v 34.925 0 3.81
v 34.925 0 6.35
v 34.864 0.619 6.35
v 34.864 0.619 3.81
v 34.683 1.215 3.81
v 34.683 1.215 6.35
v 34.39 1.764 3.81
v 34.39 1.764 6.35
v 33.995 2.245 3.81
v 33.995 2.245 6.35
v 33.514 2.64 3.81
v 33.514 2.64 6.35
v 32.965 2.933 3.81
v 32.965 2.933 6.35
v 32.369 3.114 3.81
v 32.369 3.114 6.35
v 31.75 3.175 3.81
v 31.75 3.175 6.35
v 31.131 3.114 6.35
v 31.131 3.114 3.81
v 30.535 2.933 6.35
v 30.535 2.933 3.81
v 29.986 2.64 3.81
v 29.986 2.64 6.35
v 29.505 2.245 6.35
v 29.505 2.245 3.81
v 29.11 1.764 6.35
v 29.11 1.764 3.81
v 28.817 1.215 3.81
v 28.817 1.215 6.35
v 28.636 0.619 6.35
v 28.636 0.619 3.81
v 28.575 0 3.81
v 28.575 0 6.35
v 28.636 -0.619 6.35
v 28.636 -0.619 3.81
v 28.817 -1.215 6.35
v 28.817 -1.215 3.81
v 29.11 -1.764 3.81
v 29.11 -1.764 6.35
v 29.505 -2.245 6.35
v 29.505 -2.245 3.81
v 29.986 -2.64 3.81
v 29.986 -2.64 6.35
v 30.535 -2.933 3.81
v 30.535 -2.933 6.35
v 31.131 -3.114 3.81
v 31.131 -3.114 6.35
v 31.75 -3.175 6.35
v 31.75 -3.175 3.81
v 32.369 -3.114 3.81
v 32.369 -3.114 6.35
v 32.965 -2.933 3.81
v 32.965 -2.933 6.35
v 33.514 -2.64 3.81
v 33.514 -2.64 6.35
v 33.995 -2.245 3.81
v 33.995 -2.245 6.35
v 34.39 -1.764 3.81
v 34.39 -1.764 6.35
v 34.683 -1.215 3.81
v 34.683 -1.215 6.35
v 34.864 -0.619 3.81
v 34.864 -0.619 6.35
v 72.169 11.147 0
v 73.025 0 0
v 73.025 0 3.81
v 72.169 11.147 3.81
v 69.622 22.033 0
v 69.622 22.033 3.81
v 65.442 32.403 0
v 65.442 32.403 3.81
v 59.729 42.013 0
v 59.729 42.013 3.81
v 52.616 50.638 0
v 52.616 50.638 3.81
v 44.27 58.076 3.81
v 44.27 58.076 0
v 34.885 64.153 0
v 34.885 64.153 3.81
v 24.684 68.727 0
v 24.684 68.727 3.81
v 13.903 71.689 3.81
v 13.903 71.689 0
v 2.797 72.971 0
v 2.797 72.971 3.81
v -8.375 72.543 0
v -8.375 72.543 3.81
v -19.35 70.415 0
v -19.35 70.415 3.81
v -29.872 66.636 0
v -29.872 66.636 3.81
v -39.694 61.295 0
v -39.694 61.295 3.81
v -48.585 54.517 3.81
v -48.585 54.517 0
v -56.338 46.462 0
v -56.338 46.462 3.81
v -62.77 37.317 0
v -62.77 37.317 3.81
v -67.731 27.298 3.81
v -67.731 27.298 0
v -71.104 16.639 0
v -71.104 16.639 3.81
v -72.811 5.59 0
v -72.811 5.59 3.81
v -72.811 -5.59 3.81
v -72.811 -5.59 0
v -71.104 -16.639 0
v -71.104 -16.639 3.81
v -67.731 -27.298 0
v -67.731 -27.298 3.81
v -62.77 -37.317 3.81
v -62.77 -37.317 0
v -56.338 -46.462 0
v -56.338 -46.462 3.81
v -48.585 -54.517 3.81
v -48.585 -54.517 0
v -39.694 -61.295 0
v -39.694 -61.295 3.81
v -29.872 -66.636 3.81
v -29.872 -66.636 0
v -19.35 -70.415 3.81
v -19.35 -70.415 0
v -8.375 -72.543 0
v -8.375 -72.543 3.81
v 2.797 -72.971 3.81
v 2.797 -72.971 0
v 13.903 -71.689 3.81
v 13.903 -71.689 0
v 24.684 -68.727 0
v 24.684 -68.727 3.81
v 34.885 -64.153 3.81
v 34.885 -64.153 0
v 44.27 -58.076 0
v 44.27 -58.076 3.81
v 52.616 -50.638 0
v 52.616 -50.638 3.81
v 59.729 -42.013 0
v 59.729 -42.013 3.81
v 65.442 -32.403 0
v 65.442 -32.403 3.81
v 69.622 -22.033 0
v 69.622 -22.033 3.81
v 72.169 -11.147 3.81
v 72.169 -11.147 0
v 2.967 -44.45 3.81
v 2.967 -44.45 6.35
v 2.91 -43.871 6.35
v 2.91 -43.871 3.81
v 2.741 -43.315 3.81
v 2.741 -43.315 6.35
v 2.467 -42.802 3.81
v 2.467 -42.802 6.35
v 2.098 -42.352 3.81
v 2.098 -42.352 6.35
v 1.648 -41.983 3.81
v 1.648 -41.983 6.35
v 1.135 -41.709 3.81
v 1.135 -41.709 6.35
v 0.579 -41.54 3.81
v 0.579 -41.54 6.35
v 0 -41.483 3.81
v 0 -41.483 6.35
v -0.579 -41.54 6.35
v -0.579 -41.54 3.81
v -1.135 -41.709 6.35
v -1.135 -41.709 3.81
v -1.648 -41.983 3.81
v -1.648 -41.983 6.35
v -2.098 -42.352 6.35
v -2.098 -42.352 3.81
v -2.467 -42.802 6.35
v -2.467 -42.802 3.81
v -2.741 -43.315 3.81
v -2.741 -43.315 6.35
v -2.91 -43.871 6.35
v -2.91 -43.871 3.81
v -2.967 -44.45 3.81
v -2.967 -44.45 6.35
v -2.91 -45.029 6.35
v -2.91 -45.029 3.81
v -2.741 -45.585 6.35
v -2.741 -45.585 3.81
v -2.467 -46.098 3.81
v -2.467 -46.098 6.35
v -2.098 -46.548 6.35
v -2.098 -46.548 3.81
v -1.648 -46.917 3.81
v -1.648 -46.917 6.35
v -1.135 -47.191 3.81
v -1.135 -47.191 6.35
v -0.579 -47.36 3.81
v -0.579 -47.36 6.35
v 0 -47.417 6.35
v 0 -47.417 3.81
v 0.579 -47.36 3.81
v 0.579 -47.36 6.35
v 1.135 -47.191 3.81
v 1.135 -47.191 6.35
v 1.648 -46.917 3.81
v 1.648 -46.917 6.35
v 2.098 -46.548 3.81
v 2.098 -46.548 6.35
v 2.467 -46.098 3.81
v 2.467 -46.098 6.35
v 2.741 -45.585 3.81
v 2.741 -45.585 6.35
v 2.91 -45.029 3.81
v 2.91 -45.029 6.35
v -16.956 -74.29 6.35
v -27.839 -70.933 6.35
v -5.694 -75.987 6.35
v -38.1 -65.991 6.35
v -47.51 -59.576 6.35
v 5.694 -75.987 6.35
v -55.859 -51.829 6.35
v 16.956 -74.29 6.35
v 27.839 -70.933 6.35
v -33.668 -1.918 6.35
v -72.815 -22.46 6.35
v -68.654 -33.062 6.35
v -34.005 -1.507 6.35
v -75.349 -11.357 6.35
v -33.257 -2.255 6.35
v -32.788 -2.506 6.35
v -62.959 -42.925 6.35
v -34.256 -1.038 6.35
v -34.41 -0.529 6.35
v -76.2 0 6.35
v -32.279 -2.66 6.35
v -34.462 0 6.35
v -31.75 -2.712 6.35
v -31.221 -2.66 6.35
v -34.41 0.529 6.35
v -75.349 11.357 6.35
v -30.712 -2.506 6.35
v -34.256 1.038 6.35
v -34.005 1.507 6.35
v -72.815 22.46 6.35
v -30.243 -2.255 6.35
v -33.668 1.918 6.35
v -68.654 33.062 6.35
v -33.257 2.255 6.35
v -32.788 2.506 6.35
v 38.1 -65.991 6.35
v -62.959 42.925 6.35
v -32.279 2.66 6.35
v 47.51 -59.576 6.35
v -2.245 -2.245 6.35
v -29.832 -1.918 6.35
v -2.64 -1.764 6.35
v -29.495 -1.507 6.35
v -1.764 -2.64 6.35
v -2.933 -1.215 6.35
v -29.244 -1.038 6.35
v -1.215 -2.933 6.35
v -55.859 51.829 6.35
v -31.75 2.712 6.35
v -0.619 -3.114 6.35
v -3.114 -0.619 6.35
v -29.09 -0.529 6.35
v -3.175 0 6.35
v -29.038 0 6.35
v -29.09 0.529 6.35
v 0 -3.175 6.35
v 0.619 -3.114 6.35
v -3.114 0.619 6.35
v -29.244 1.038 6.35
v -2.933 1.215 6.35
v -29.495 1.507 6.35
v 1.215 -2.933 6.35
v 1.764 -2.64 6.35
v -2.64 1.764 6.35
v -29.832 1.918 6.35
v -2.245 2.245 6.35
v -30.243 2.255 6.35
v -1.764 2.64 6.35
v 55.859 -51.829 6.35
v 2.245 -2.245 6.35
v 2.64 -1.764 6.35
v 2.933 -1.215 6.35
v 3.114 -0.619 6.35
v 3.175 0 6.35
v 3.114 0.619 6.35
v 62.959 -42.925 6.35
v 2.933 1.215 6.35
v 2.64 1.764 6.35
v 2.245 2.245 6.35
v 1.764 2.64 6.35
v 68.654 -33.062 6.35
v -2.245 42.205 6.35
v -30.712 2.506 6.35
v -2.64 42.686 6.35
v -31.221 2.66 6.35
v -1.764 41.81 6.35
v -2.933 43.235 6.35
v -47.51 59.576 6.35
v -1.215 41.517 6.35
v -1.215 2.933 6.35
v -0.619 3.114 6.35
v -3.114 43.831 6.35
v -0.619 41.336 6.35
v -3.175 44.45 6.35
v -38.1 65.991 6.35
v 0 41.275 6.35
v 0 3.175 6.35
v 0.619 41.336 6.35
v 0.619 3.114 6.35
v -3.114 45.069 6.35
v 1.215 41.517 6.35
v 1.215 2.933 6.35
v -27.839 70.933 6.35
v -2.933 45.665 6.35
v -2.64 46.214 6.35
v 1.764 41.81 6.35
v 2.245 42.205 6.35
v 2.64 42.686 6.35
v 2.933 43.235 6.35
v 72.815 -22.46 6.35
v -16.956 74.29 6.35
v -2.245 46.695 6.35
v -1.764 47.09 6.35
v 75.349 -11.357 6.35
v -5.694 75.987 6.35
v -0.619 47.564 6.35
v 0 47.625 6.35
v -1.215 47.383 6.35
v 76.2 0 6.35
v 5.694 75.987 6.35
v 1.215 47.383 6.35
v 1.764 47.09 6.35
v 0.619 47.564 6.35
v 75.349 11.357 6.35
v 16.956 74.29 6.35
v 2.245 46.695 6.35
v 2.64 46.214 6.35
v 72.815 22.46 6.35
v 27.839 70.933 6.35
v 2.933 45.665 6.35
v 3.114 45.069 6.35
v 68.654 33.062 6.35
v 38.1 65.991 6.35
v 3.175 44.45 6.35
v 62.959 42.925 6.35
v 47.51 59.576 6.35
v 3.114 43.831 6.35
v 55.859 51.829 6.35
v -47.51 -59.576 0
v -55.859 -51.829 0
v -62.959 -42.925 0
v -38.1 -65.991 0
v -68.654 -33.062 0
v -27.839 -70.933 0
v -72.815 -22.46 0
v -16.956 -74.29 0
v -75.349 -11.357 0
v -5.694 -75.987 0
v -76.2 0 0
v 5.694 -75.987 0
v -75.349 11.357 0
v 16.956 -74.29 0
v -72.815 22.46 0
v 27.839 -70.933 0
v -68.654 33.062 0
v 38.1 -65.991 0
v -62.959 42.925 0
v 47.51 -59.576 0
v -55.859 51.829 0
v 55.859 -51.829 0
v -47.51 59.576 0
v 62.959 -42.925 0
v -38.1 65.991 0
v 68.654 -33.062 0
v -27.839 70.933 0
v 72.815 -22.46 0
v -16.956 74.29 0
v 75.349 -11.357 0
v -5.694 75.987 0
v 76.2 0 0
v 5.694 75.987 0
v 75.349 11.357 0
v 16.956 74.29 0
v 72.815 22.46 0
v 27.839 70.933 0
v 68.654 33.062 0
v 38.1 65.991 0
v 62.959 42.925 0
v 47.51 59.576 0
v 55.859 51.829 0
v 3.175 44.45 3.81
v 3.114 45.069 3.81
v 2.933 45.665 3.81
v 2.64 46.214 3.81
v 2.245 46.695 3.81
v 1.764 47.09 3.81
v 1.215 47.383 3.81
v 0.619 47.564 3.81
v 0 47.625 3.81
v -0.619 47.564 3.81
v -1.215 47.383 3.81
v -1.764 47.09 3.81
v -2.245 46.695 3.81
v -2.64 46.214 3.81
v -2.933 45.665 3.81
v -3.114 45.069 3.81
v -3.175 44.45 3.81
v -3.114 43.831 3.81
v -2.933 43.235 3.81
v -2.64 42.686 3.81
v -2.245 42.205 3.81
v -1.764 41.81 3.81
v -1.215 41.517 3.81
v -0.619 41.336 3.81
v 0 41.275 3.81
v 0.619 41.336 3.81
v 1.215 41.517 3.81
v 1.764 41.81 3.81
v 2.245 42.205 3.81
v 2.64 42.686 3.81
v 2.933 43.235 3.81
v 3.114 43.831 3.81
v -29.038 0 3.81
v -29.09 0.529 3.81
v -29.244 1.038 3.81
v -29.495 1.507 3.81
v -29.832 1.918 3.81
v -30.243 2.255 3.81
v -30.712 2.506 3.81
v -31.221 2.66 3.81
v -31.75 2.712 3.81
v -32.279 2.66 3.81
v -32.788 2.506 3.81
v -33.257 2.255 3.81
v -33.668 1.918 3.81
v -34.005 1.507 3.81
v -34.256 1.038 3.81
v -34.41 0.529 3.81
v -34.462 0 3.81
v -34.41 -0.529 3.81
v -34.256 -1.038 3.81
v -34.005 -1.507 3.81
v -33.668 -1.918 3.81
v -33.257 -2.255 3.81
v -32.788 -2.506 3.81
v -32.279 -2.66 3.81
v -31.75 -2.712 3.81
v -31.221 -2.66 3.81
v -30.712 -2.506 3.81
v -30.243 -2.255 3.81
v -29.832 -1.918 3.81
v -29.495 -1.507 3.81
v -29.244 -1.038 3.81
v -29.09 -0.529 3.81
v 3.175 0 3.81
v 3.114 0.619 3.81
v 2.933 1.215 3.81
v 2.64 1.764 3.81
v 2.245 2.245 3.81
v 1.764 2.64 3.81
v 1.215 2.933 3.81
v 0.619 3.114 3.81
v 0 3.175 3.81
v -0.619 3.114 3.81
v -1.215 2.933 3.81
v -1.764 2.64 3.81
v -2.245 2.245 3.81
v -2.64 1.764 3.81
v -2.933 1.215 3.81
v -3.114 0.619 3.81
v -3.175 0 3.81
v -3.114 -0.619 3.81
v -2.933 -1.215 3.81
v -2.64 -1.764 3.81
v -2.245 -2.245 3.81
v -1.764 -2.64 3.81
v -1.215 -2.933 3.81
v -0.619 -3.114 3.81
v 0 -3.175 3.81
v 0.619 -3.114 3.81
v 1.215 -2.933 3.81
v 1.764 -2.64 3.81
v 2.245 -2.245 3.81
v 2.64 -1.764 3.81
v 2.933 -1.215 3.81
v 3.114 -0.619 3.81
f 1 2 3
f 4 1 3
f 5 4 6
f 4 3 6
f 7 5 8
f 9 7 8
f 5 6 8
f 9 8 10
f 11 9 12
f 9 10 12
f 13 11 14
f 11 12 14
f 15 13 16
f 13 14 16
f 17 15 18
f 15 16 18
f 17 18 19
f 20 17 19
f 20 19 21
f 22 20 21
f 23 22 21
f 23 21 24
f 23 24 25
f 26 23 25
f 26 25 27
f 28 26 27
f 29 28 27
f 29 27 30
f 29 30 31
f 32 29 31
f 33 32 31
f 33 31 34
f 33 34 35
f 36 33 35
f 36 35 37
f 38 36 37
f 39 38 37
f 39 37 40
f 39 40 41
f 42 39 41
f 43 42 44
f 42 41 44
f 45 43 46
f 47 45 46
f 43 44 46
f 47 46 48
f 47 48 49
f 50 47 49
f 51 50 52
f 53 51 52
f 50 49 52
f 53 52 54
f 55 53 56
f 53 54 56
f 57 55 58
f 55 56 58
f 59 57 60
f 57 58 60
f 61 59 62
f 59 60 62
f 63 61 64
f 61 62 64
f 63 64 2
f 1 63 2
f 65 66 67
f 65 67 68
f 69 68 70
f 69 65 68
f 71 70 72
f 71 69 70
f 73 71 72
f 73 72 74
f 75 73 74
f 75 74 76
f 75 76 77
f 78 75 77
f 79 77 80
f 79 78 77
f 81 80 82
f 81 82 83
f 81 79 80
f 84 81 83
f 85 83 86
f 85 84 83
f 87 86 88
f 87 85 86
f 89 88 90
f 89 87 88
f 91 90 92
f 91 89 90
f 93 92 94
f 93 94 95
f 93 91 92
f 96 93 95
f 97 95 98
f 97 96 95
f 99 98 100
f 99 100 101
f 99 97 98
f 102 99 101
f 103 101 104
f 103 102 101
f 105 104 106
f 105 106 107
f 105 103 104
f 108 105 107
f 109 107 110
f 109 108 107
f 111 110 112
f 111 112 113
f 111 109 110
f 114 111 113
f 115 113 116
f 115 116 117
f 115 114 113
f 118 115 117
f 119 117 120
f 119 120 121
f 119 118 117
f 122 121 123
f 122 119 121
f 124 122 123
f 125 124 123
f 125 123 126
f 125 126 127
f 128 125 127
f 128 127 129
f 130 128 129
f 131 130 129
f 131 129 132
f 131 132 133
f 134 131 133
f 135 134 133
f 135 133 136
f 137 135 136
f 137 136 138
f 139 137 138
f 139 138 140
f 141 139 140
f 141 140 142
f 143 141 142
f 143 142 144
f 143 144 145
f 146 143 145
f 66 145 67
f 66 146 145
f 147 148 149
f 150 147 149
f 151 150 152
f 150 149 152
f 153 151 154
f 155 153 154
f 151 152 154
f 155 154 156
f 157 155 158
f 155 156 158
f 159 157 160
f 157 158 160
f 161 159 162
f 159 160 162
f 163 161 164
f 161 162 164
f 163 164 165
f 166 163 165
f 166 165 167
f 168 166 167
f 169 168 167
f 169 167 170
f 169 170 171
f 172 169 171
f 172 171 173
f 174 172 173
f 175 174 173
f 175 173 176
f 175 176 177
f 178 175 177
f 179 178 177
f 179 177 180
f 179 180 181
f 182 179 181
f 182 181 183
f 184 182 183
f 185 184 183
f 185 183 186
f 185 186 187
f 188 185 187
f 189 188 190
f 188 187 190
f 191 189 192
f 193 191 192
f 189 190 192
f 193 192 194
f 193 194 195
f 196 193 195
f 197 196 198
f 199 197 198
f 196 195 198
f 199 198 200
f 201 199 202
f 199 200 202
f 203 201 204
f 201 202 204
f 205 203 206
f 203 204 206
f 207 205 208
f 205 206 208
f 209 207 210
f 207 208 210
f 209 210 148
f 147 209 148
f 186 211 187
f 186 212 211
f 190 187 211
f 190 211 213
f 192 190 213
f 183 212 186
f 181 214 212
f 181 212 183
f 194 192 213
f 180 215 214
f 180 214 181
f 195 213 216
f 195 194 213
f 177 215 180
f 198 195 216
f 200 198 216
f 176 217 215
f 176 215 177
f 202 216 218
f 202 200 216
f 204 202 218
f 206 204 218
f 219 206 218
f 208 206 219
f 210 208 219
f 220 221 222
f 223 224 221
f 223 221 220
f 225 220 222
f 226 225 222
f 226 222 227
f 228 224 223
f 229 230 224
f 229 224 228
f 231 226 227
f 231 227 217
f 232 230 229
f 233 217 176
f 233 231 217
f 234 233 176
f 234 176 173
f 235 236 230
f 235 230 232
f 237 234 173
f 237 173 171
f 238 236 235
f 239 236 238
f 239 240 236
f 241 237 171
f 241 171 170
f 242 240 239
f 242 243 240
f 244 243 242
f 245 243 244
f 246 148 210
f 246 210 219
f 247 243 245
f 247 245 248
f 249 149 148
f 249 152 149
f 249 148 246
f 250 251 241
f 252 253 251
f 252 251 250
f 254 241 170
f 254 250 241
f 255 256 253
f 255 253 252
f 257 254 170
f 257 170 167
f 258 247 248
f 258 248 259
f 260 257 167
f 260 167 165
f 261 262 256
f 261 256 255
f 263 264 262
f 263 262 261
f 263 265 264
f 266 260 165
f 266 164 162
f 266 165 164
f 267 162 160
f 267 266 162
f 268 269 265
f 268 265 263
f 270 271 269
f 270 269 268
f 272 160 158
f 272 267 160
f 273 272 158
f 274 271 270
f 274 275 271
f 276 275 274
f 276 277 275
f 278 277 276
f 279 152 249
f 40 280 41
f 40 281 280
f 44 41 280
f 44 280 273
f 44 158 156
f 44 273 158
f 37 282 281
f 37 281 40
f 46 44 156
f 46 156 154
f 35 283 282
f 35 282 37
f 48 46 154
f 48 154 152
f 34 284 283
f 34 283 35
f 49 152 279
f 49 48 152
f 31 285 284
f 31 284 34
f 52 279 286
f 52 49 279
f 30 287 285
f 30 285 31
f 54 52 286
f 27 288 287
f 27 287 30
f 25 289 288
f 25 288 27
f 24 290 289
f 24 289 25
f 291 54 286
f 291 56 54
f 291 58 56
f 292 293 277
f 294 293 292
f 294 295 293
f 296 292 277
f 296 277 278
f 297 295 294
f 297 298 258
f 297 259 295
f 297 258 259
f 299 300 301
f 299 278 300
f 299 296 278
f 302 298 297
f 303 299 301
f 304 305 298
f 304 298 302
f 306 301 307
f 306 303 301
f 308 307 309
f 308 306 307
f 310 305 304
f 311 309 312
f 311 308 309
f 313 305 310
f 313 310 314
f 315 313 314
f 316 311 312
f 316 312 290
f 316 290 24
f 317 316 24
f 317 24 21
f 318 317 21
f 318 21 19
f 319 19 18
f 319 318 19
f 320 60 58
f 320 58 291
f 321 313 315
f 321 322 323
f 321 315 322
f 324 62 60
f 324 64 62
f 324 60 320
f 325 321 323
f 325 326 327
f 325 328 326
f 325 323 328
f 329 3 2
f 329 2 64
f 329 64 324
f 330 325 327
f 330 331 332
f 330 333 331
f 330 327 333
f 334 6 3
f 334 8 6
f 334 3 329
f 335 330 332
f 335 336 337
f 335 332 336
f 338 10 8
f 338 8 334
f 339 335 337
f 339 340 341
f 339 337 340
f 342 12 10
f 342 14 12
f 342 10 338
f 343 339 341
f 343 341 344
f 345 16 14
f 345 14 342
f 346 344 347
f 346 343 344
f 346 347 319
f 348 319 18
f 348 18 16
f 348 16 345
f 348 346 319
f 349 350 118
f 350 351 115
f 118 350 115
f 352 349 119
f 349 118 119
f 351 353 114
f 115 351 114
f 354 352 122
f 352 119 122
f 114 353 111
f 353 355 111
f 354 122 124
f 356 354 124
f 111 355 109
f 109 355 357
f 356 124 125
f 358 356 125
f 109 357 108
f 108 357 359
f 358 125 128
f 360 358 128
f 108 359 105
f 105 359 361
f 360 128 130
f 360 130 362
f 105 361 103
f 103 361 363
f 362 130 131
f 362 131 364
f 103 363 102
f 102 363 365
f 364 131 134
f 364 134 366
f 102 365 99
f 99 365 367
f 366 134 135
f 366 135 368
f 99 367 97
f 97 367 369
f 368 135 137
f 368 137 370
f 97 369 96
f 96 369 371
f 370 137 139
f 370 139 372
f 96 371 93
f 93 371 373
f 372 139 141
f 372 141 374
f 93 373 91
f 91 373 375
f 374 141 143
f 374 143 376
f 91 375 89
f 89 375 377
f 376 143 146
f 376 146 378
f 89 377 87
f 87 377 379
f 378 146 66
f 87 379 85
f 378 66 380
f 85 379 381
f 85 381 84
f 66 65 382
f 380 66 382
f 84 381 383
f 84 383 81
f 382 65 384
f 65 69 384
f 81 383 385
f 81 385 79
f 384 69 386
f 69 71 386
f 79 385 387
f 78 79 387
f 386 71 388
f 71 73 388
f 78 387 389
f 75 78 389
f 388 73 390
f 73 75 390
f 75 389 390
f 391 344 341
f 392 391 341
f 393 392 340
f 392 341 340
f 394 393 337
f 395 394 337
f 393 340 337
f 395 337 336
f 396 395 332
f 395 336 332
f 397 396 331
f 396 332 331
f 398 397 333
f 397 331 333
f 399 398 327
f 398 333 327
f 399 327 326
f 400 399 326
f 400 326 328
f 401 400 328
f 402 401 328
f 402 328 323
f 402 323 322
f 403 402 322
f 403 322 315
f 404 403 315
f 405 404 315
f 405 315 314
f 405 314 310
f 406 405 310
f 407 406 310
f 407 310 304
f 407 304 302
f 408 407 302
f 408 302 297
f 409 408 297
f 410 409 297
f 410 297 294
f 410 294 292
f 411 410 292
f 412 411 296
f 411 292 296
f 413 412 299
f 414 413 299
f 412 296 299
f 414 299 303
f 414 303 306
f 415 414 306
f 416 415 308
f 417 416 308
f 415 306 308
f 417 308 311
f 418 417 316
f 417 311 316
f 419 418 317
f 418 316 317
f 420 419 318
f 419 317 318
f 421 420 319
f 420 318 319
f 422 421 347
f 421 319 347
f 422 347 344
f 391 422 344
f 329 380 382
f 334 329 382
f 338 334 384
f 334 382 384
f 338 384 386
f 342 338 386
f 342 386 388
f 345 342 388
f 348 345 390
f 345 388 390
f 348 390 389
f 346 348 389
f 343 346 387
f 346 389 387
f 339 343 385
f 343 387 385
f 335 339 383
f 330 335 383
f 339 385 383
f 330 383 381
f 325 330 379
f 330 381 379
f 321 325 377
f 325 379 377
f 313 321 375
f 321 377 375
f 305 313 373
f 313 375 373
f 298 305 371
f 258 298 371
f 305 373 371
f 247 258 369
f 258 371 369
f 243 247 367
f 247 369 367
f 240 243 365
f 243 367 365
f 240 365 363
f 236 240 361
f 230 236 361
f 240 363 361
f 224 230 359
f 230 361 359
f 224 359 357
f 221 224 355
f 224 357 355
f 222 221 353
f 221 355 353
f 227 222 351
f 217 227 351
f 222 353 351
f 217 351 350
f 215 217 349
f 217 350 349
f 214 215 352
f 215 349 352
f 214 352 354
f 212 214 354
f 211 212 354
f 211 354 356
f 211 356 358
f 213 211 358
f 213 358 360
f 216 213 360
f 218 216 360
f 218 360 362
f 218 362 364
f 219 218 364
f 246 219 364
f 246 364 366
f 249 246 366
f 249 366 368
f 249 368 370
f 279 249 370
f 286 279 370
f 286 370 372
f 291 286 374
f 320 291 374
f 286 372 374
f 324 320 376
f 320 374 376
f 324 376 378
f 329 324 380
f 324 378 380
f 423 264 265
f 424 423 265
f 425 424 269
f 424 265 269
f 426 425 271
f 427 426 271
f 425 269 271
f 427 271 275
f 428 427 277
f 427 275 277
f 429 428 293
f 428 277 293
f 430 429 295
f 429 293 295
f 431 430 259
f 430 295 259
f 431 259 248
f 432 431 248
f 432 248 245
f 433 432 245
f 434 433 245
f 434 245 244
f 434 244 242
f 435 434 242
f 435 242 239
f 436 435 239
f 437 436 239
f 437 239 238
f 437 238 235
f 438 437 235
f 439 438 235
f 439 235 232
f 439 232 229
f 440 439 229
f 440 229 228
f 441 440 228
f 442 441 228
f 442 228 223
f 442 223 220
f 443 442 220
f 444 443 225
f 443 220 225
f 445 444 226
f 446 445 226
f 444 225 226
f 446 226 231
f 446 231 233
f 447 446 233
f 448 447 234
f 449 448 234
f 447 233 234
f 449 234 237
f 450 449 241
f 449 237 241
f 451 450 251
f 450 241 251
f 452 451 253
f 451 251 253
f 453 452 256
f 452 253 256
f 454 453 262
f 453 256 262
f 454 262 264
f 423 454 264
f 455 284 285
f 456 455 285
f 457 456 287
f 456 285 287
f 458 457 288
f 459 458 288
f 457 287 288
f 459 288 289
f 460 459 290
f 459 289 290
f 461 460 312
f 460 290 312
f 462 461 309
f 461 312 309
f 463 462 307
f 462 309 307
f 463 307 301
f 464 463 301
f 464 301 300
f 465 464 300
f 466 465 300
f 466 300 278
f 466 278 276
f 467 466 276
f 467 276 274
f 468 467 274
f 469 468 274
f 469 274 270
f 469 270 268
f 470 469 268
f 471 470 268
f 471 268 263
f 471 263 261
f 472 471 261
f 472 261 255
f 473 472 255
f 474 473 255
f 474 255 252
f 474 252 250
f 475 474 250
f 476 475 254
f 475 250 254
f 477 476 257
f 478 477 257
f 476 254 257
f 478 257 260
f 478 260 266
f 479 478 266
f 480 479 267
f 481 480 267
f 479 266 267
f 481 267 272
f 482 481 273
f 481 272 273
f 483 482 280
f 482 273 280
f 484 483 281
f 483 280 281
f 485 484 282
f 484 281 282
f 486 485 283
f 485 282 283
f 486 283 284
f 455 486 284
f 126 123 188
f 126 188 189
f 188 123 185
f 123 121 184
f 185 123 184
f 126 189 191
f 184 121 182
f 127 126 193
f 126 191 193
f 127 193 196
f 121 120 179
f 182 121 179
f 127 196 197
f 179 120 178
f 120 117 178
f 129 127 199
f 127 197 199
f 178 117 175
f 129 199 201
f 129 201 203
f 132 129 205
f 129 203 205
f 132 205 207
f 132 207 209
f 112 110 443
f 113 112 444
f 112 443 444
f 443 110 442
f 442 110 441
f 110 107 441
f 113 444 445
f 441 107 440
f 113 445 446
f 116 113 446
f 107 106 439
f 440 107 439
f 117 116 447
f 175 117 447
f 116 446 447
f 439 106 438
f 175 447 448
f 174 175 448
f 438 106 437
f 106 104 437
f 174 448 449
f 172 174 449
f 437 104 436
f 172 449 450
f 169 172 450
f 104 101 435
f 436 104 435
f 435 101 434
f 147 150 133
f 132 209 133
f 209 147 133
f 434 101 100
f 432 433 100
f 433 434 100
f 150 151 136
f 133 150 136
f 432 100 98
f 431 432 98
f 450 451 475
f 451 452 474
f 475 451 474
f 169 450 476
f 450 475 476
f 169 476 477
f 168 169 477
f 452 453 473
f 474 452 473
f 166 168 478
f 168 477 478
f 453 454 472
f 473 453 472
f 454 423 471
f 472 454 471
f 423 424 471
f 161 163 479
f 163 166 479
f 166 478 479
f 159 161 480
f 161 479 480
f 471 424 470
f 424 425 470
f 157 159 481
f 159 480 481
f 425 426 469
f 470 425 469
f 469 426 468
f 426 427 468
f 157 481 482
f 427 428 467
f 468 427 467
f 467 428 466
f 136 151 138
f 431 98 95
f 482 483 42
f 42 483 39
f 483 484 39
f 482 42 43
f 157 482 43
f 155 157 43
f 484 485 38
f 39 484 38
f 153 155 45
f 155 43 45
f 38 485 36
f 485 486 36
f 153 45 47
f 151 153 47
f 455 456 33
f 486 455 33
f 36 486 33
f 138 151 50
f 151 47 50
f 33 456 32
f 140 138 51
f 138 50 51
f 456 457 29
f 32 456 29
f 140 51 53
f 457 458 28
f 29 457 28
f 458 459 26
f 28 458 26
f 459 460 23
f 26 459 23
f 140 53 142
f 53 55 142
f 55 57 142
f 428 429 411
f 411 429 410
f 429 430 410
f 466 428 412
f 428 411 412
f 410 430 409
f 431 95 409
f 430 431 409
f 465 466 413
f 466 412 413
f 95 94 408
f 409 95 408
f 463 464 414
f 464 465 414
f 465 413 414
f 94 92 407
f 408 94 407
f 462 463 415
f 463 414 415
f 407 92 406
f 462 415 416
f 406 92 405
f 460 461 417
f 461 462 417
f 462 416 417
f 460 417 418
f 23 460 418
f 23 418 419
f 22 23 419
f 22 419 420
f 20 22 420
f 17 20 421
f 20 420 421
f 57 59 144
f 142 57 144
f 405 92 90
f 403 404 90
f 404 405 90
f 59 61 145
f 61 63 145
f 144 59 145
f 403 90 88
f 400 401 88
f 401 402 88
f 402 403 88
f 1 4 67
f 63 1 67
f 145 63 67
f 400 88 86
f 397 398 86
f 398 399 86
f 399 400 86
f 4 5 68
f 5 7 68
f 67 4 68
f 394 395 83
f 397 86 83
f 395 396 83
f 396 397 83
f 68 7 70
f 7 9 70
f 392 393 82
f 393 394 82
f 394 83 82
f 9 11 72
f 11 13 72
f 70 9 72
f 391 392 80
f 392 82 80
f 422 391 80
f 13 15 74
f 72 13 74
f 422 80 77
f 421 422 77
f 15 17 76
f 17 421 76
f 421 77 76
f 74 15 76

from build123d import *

# Parameters (mm, degrees)
F0_R     = 76.2
F1_DEPTH = 6.35
F2_R     = 73.025
F3_DEPTH = 3.81
F4_R     = 2.712473
F4_R_2   = 3.175
F5_DEPTH = 6.351
F6_R     = 3.175
F6_R_2   = 2.966679
F7_DEPTH = 6.351


with BuildPart() as f1:
    # F0 (on Top) → F1 (new body)
    with BuildSketch(Plane.XY):
        Circle(F0_R)
    extrude(amount=F1_DEPTH)

    # F2 (on Top) → F3 (cut)
    with BuildSketch(Plane.XY):
        Circle(F2_R)
    extrude(amount=F3_DEPTH, mode=Mode.SUBTRACT)

    # F4 (on face) → F5 (cut, through all)
    with BuildSketch(Plane.XY.offset(6.35)):
        with Locations((-31.75, 0)):
            Circle(F4_R)
        with Locations((31.75, 0)):
            Circle(F4_R_2)
        Circle(F4_R_2)
    extrude(amount=-F5_DEPTH, mode=Mode.SUBTRACT)

    # F6 (on face) → F7 (cut, through all)
    with BuildSketch(Plane.XY.offset(6.35)):
        with Locations((0, 44.45)):
            Circle(F6_R)
        with Locations((0, -44.45)):
            Circle(F6_R_2)
    extrude(amount=-F7_DEPTH, mode=Mode.SUBTRACT)


solid = f1.part
